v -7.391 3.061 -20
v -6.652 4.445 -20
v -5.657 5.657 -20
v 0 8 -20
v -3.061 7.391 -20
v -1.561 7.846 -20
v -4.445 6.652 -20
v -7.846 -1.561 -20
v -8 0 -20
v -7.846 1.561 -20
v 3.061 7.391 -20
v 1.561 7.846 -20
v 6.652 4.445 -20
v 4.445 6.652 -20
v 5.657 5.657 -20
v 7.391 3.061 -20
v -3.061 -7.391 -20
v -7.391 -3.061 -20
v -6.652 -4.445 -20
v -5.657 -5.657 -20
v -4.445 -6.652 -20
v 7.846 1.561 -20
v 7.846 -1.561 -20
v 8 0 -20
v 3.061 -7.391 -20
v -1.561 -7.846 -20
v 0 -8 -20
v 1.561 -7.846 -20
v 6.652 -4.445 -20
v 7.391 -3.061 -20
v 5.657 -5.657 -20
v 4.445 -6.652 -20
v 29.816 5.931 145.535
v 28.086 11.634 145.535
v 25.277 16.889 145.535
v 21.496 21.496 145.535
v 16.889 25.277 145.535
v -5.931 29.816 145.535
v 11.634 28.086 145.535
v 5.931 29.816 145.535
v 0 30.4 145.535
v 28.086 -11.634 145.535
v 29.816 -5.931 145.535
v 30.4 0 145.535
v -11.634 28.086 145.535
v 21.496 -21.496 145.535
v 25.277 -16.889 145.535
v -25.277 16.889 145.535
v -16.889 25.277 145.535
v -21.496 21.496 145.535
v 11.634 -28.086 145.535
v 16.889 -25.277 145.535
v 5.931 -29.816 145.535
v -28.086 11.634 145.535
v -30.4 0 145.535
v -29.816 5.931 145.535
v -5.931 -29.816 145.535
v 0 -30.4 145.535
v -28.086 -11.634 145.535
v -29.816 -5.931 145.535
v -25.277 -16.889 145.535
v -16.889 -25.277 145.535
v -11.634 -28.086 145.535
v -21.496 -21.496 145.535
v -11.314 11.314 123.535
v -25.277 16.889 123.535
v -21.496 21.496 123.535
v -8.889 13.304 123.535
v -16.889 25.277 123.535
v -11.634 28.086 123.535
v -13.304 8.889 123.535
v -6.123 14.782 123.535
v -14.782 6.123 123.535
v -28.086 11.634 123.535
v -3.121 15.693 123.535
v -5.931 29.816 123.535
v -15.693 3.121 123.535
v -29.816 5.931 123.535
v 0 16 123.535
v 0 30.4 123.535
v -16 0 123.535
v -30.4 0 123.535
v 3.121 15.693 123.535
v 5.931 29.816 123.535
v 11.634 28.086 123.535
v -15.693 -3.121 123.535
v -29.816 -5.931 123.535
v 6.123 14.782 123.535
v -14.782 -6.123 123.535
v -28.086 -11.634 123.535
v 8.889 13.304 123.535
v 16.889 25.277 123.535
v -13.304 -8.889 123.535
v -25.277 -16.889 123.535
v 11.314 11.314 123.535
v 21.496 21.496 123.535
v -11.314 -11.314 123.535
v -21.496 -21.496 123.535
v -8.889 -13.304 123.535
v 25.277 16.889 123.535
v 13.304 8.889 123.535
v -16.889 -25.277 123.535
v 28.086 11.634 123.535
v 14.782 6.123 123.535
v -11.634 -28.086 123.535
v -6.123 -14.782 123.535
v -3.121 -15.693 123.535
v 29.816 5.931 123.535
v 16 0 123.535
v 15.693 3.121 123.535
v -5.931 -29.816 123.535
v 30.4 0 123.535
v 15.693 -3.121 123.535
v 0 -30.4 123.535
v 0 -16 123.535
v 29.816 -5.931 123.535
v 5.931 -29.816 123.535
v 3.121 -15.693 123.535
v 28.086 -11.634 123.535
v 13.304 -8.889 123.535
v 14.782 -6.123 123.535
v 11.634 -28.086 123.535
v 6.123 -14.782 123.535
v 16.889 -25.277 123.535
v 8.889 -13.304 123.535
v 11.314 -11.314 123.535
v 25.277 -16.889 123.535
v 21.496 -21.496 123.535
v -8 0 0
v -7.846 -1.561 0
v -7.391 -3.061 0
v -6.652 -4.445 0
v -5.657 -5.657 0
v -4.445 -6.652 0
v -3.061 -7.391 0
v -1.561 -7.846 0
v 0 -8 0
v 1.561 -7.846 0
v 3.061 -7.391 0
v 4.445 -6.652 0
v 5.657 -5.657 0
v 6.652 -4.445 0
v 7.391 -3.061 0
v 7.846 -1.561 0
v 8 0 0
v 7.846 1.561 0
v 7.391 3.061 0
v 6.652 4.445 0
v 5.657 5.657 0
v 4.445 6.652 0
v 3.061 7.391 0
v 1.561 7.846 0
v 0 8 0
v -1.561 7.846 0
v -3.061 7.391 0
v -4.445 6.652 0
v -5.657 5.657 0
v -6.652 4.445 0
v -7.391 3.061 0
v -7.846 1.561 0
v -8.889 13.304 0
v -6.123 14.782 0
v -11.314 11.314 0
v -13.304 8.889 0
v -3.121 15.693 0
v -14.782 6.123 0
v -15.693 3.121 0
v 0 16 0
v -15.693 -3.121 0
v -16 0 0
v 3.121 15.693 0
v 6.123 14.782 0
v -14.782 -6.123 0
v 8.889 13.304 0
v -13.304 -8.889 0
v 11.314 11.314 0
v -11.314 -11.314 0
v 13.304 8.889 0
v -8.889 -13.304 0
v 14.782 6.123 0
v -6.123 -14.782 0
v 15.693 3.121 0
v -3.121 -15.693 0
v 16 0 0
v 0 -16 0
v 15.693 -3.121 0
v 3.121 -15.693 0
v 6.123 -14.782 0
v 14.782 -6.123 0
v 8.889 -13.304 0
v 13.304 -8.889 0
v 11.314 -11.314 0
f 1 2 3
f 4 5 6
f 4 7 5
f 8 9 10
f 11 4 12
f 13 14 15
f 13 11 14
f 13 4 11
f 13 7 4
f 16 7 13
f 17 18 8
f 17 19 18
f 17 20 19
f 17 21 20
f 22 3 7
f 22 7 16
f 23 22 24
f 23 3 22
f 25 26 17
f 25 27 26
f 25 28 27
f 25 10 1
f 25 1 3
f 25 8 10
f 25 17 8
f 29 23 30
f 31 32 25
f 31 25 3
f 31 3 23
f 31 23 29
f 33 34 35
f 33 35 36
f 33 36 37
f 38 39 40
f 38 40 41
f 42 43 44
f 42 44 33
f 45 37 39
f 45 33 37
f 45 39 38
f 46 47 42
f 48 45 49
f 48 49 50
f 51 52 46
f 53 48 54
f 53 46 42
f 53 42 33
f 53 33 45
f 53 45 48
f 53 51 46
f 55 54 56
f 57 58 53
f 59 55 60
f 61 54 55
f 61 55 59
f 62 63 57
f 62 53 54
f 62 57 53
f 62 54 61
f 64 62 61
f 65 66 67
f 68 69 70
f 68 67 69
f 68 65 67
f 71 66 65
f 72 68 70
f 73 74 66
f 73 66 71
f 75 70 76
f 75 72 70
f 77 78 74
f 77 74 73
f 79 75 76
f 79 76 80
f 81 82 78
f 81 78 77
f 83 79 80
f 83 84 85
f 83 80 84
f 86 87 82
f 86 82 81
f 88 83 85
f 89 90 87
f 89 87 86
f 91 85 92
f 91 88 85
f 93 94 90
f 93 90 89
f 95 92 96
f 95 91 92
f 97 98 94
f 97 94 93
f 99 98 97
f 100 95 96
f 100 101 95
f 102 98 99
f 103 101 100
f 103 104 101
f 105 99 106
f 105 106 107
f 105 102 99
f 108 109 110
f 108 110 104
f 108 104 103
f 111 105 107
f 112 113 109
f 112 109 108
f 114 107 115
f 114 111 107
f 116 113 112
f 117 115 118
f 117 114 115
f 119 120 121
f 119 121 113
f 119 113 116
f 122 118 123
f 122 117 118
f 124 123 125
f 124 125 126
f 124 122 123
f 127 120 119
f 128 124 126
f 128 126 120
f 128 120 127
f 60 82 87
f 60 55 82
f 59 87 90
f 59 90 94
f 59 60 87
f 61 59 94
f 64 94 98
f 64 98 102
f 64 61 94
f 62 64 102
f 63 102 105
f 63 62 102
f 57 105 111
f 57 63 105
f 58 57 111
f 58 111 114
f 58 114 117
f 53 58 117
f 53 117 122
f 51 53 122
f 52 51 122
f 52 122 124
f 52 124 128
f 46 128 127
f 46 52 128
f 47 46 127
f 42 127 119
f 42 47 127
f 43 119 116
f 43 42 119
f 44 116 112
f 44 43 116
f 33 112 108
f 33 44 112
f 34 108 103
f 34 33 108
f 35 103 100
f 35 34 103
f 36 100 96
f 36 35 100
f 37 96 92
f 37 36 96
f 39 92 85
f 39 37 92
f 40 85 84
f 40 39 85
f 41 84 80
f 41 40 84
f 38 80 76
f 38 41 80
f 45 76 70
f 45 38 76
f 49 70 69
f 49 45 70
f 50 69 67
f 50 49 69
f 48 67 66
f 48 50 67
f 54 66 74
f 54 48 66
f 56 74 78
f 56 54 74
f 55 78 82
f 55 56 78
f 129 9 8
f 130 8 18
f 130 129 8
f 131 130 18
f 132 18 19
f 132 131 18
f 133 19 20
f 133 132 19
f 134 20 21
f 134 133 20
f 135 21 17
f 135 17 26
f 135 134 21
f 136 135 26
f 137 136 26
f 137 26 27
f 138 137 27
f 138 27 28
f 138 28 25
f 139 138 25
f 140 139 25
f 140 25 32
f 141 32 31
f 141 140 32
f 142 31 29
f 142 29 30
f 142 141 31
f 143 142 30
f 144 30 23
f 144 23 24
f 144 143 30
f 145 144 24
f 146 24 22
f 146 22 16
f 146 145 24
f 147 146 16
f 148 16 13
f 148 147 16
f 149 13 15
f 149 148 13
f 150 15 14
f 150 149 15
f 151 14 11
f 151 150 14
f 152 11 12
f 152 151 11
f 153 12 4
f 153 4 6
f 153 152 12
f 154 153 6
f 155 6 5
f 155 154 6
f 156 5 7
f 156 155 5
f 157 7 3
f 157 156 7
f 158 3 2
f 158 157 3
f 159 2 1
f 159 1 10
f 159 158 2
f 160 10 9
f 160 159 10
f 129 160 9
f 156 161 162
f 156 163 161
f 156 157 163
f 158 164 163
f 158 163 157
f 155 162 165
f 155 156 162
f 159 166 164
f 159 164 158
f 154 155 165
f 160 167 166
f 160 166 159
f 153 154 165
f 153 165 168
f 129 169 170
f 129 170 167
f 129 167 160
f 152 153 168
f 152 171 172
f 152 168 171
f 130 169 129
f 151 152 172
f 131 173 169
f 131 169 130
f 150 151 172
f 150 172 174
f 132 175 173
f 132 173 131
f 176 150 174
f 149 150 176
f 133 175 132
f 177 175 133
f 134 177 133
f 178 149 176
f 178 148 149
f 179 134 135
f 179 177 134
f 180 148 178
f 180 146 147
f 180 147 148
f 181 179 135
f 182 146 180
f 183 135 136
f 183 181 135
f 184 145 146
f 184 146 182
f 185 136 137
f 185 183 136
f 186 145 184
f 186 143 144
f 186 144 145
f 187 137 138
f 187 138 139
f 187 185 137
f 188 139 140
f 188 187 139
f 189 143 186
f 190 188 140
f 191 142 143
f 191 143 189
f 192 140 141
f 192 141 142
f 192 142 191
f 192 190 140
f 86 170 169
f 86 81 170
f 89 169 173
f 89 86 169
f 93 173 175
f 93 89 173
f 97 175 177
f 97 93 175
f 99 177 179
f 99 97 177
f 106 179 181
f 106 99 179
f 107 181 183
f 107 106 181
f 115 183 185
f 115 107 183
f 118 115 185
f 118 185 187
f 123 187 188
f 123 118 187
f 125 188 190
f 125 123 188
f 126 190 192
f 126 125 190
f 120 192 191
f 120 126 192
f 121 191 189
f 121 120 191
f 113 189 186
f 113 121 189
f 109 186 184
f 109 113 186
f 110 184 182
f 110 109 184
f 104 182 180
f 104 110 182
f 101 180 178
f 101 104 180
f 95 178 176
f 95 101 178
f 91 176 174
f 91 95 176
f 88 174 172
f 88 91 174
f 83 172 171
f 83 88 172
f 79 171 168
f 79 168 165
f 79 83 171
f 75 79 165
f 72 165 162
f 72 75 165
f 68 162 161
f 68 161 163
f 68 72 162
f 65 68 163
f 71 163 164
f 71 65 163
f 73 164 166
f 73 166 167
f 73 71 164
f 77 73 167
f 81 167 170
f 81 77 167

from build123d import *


with BuildPart() as part:
    # Skizze1 → Rotation1 (revolve)
    with BuildSketch(Plane(origin=(0, 0, 0), x_dir=(1, 0, 0), z_dir=(0, 1, 0)), mode=Mode.PRIVATE) as rotation1_sk:
        Polygon((0, 20), (8, 20), (8, 0), (16, 0), (16, -123.535), (30.4, -123.535), (30.4, -145.535), (0, -145.535), align=None)
    revolve(rotation1_sk.sketch.rotate(Axis((0, 0, -20), (0, 0, 1)), 180), axis=Axis((0, 0, -20), (0, 0, 1)))  # turned: the seam where the file's is


solid = part.part
